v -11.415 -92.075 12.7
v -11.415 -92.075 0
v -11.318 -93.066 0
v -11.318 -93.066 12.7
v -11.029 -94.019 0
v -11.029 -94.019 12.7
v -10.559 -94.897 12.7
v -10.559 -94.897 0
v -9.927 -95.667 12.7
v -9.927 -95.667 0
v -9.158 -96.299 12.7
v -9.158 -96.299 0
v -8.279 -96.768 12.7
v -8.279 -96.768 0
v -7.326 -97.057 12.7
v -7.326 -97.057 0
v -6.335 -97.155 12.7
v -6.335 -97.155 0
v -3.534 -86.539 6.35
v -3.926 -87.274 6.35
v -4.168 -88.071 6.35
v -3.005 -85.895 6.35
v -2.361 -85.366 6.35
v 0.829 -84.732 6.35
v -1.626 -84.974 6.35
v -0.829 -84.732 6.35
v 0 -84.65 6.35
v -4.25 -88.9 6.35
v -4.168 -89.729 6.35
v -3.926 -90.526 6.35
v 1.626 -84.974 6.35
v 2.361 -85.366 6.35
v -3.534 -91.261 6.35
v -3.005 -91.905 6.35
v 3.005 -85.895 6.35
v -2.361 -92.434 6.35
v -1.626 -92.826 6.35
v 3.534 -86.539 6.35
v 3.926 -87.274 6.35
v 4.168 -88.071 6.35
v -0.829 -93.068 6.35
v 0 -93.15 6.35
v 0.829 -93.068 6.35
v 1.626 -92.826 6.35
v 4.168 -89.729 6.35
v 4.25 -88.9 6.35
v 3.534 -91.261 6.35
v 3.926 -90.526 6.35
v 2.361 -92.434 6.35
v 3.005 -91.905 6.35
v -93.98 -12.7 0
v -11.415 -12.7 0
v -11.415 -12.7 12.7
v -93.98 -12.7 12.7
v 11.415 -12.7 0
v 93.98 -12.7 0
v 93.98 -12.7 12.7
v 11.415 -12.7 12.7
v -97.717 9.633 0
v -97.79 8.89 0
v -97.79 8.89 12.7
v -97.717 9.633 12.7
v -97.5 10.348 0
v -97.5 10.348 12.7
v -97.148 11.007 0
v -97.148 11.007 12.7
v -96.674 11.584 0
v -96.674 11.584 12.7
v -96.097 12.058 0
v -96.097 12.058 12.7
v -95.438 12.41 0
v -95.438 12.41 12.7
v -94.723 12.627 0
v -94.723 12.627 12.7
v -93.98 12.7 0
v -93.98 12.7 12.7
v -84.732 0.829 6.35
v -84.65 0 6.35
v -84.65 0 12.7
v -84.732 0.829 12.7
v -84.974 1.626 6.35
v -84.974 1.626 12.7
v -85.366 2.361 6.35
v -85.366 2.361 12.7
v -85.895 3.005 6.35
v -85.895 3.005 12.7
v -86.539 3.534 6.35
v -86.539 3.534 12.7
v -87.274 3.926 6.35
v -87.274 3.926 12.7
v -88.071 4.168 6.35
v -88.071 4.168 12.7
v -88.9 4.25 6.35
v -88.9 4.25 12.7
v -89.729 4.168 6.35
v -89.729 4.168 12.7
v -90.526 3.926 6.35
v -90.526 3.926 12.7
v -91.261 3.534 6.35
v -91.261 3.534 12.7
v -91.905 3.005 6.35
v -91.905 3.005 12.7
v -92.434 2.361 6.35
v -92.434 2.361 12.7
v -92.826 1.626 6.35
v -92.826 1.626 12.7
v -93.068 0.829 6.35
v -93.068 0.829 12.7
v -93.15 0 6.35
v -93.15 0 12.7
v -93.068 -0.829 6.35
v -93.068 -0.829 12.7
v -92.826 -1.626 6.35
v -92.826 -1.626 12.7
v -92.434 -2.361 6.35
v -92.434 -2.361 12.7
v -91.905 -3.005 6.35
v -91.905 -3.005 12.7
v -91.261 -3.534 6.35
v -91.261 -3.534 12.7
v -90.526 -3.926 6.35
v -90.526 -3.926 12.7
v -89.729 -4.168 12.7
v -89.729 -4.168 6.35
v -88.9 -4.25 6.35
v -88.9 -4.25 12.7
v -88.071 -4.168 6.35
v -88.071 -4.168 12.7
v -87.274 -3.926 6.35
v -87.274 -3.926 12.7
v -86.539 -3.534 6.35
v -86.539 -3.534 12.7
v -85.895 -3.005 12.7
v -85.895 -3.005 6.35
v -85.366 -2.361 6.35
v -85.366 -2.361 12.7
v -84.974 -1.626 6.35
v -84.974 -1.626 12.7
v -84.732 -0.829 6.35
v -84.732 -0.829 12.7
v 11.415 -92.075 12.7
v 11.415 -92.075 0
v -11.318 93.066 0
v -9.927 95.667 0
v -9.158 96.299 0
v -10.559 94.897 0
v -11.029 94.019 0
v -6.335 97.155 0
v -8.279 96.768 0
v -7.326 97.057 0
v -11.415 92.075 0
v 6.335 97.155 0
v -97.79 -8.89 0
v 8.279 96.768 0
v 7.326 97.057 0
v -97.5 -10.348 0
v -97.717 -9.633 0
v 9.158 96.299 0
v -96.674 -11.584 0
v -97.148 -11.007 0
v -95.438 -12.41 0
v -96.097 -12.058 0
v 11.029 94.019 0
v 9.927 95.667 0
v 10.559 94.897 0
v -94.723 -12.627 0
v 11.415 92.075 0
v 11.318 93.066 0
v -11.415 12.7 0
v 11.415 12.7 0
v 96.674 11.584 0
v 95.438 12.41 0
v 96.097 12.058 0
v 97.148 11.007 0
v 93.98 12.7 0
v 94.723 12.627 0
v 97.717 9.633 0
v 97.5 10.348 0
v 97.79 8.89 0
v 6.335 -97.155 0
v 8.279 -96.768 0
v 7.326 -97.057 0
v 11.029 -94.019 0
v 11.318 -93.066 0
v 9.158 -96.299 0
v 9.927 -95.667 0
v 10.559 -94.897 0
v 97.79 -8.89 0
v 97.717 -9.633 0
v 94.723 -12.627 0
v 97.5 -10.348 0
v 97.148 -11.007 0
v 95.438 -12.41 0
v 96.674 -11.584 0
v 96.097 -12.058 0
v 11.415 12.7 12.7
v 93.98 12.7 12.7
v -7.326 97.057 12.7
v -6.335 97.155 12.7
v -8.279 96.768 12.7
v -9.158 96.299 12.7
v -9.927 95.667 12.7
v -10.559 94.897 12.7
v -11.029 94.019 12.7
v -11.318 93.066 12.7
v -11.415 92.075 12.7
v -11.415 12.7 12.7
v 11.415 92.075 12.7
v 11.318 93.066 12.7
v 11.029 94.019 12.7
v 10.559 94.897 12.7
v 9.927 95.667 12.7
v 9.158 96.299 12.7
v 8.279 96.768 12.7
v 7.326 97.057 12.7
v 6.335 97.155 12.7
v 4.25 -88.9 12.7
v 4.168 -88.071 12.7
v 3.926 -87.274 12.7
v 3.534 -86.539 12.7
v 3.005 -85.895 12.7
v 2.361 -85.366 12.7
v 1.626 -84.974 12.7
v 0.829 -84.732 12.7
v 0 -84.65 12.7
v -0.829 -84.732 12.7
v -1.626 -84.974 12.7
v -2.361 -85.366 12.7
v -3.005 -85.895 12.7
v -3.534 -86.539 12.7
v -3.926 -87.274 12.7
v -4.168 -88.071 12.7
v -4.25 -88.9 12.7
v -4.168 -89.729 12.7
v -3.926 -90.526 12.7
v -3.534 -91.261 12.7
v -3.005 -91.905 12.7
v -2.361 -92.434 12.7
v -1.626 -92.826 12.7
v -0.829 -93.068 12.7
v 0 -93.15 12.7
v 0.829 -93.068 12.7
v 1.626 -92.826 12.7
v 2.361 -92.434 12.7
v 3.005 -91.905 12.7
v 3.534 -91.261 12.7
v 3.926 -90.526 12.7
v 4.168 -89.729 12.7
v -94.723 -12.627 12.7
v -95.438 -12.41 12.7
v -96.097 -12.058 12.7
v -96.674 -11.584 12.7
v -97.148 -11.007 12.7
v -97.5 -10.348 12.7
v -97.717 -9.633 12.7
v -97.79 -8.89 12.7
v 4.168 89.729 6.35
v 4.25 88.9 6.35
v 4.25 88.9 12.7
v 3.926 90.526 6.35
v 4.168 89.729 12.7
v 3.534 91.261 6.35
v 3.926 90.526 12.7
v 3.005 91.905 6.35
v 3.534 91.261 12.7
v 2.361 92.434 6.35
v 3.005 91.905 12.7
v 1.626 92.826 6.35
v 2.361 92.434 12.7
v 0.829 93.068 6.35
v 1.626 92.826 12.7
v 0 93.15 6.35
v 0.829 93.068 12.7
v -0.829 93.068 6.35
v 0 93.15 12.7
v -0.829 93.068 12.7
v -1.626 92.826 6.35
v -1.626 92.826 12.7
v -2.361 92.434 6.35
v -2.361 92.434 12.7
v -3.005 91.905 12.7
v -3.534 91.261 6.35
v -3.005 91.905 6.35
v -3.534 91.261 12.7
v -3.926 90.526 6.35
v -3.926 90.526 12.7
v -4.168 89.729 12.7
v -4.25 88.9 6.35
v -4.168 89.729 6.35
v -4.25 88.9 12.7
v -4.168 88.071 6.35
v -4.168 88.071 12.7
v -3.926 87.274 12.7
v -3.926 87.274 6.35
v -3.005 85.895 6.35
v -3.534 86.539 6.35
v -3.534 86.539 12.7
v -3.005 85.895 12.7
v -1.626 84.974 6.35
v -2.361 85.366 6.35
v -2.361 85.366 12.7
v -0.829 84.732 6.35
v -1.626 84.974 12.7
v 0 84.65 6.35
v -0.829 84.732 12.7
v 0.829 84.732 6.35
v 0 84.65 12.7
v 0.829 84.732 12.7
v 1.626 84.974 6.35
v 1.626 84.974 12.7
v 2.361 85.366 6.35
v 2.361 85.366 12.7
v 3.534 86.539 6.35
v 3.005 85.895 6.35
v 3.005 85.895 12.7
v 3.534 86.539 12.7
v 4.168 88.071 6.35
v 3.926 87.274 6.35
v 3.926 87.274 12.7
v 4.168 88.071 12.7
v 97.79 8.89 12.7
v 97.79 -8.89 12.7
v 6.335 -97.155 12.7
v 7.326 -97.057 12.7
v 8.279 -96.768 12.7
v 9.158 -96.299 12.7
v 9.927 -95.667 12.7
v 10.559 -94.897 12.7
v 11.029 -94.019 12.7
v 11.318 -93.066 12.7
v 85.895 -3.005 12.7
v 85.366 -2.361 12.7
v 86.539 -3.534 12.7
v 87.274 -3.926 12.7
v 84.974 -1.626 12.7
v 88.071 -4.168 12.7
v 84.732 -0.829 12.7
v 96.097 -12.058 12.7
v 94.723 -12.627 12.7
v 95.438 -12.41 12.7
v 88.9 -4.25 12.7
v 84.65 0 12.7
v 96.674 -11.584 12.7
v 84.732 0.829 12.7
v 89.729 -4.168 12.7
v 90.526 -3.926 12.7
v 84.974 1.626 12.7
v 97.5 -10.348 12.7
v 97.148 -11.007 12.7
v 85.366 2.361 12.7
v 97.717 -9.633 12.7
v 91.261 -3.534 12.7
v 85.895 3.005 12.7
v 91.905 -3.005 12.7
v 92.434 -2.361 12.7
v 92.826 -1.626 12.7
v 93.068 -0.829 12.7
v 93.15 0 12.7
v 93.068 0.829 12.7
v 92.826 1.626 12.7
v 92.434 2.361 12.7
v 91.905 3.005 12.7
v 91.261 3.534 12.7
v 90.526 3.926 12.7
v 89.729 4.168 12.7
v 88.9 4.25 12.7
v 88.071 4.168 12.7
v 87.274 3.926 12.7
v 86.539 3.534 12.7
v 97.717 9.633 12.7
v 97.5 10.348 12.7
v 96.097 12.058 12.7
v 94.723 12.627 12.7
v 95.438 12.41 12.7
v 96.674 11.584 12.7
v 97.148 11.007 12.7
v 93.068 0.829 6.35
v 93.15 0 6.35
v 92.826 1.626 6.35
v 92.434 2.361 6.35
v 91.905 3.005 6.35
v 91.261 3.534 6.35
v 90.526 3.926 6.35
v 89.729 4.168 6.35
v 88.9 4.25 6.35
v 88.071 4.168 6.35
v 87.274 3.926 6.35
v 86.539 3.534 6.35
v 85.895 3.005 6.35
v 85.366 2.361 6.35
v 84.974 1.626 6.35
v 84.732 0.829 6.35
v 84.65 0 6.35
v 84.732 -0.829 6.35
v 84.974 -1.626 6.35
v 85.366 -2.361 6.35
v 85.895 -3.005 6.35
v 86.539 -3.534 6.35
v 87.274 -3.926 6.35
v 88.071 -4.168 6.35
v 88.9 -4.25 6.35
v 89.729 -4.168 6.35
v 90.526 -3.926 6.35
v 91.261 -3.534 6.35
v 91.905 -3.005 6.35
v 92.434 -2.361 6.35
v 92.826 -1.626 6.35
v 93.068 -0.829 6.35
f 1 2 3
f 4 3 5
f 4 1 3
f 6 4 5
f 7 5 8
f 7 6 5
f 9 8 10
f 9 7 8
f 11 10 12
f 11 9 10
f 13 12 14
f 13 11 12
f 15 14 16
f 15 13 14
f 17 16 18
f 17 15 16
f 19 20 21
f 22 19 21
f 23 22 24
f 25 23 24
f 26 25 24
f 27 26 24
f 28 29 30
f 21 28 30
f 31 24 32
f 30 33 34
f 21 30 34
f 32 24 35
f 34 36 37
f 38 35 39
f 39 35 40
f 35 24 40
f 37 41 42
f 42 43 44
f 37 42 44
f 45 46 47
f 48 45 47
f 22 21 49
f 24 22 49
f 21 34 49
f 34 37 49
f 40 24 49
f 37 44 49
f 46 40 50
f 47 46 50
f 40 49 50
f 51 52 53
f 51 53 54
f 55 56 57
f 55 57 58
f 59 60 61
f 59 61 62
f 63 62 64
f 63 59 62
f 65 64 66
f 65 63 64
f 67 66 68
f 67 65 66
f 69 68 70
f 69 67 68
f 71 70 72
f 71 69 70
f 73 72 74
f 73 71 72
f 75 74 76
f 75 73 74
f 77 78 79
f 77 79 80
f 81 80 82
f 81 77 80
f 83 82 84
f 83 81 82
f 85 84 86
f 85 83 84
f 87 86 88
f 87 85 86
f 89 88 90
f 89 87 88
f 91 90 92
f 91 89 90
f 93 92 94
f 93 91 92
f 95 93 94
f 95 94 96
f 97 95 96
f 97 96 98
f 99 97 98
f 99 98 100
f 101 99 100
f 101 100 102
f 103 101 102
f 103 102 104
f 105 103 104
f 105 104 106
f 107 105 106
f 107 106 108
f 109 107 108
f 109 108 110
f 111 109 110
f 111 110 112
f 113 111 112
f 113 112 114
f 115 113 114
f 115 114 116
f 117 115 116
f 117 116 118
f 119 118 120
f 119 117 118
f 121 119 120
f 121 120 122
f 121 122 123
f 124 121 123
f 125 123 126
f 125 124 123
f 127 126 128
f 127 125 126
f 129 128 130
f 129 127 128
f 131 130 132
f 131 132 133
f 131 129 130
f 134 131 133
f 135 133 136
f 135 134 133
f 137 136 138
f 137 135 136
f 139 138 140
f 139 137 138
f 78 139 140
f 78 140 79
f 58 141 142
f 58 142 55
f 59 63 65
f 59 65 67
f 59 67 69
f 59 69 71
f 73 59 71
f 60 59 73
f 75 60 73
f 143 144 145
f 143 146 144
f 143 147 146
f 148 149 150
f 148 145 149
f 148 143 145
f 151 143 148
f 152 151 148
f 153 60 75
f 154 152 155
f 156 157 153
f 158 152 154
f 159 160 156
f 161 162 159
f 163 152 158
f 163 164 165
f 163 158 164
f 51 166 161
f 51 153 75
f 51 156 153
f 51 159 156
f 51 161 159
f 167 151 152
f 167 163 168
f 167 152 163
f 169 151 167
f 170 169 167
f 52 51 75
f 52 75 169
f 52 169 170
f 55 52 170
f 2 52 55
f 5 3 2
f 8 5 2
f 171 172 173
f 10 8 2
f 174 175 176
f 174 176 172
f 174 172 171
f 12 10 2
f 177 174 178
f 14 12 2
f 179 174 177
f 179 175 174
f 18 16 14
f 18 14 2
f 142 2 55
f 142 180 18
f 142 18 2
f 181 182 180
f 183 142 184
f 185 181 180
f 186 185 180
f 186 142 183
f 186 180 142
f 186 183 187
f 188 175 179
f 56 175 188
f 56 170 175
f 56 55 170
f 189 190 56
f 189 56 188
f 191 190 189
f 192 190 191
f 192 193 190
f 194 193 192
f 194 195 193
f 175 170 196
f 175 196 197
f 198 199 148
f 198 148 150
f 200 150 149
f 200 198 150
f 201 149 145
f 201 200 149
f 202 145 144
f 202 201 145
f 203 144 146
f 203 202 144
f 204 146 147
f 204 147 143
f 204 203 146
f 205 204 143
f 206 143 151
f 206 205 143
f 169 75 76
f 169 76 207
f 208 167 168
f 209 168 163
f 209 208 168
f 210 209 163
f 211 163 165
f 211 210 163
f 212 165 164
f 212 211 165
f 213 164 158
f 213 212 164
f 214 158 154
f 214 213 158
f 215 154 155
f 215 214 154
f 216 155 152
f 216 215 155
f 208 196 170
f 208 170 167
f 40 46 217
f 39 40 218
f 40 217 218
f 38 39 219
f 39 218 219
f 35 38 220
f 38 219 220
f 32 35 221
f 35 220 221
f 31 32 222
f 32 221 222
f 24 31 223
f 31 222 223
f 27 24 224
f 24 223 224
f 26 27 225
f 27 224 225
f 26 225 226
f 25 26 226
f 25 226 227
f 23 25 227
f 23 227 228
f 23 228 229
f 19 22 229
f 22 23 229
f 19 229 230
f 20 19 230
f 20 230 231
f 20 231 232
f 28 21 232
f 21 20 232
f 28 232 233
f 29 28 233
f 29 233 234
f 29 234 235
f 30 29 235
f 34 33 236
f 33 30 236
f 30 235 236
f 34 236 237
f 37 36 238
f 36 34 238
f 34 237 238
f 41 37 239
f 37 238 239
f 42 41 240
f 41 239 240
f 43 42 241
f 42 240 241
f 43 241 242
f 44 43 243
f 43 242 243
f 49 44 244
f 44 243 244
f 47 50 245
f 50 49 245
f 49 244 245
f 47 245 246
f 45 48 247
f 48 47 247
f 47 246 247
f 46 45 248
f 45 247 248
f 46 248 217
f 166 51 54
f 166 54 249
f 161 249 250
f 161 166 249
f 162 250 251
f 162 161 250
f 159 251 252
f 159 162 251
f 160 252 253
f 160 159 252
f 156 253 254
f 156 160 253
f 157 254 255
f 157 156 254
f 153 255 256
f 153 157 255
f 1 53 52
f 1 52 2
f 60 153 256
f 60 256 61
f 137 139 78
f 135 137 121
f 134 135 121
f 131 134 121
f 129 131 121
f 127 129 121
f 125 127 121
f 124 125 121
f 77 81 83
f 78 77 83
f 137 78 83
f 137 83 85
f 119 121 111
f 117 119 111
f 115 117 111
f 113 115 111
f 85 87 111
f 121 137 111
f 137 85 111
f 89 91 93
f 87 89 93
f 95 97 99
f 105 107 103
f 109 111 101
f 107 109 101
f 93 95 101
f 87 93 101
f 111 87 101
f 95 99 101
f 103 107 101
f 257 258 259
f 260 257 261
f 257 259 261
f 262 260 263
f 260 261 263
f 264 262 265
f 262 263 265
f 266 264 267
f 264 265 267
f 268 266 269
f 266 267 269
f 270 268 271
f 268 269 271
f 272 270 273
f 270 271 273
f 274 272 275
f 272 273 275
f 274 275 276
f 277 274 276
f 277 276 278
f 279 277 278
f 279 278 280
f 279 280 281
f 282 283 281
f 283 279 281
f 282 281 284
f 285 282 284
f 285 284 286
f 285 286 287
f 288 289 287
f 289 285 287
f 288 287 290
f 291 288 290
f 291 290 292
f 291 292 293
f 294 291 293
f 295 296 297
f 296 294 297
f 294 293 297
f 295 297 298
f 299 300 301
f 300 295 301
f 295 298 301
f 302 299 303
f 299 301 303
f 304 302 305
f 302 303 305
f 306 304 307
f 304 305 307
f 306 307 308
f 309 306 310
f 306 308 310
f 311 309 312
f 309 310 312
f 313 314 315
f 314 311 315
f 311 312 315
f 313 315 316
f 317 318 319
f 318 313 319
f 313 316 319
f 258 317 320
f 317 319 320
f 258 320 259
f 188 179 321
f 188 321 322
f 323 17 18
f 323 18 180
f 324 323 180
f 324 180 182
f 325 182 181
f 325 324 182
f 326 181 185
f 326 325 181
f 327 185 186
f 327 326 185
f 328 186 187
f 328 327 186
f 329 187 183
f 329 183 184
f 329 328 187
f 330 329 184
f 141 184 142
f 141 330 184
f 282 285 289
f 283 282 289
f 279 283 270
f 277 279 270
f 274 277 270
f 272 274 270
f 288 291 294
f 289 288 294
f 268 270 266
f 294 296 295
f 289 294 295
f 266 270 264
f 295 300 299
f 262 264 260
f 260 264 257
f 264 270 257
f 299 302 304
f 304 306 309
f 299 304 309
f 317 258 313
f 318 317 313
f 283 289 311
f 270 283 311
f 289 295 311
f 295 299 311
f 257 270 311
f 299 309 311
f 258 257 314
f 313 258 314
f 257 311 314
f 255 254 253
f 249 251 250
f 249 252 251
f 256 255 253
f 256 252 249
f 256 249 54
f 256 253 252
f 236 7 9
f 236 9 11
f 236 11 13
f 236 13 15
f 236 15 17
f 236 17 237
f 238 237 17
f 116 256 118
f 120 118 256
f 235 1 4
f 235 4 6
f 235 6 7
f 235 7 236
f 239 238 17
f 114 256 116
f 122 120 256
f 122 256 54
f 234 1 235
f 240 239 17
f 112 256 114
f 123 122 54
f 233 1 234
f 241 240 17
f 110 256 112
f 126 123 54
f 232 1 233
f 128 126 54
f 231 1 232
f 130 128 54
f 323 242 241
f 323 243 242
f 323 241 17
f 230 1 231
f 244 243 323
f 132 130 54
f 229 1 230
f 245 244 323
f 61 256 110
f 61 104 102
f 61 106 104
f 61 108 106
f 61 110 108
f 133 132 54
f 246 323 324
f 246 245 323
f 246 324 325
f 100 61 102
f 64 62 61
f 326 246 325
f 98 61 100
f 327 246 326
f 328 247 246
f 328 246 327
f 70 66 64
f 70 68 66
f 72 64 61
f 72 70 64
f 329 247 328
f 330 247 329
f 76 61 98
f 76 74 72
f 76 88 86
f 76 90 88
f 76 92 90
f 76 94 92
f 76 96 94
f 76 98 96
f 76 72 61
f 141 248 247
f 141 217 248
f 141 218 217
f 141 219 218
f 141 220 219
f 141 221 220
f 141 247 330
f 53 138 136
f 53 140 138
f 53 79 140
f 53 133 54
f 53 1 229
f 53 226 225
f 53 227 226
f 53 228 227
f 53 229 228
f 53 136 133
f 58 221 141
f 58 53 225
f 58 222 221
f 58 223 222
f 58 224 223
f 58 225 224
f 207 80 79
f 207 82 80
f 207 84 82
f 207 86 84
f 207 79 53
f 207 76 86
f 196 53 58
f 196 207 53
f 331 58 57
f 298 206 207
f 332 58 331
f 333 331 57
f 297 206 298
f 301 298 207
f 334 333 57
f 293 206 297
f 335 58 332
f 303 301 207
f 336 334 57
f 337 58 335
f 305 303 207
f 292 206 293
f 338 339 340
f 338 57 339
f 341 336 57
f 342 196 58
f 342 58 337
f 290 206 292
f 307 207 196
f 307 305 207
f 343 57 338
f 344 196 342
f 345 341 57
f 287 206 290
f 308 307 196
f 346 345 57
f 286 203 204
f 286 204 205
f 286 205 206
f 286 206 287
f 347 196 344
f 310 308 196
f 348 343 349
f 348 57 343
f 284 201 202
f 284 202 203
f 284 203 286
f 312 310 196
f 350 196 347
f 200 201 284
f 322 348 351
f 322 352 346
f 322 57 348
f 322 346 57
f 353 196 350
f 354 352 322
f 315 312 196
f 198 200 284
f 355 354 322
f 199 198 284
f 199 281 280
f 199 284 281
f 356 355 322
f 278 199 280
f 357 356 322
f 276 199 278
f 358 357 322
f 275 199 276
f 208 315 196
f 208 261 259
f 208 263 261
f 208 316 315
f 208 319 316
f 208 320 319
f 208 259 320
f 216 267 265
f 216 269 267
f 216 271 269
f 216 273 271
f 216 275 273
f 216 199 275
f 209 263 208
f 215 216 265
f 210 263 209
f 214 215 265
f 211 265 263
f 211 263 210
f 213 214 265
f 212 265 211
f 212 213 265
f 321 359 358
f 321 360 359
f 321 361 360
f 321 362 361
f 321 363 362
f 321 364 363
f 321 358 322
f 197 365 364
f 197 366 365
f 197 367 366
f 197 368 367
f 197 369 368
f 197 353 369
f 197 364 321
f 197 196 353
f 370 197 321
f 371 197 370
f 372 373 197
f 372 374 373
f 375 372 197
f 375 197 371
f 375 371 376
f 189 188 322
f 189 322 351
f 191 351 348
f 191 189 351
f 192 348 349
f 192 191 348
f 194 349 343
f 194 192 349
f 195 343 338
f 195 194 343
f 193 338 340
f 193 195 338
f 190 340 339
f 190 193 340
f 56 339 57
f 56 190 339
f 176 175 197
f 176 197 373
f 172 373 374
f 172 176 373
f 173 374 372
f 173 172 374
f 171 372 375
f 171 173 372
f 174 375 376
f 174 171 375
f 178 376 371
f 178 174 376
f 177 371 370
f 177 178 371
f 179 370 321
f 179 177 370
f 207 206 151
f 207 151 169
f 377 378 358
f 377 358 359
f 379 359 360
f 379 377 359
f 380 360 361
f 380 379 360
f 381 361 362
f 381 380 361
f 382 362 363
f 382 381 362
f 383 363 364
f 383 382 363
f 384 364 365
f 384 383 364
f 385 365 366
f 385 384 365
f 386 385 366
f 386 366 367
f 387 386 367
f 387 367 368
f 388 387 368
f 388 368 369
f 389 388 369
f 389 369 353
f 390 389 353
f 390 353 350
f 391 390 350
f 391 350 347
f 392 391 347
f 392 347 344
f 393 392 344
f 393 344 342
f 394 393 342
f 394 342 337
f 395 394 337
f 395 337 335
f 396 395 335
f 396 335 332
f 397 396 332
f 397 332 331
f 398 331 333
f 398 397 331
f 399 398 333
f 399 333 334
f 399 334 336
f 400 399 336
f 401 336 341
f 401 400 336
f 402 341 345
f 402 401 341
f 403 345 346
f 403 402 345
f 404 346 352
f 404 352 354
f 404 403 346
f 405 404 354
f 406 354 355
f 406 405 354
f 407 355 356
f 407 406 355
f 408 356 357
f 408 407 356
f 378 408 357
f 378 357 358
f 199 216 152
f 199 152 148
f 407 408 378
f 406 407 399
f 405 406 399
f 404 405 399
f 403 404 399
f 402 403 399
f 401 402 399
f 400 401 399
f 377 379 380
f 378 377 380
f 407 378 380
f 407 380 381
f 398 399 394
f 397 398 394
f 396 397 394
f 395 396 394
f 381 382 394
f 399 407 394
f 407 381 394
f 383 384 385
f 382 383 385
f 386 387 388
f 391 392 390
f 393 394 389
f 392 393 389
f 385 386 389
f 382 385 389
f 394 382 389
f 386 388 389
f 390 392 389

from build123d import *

# Parameters (mm, degrees)
SKETCH1_R           = 4.25
BOSS_EXTRUDE1_DEPTH = 12.7
SKETCH3_R           = 4.25
BOSS_EXTRUDE3_DEPTH = 12.7
SKETCH2_R           = 4.25
BOSS_EXTRUDE2_DEPTH = 6.35


with BuildPart() as part:
    # Sketch1 → Boss-Extrude1 (new body)
    with BuildSketch(Plane.XY):
        with BuildLine():
            Line((93.98, -12.7), (-93.98, -12.7))
            ThreePointArc((-93.98, -12.7), (-96.674076836, -11.584076836), (-97.79, -8.89))
            Line((-97.79, -8.89), (-97.79, 8.89))
            ThreePointArc((-97.79, 8.89), (-96.674076836, 11.584076836), (-93.98, 12.7))
            Line((-93.98, 12.7), (93.98, 12.7))
            ThreePointArc((93.98, 12.7), (96.674076836, 11.584076836), (97.79, 8.89))
            Line((97.79, 8.89), (97.79, -8.89))
            ThreePointArc((97.79, -8.89), (96.674076836, -11.584076836), (93.98, -12.7))
        make_face()
        with Locations((-88.9, 0)):
            Circle(SKETCH1_R, mode=Mode.SUBTRACT)
        with Locations((88.9, 0)):
            Circle(SKETCH1_R, mode=Mode.SUBTRACT)
    extrude(amount=BOSS_EXTRUDE1_DEPTH)

    # Sketch3 → Boss-Extrude3 (add, through all)
    with BuildSketch(Plane.XY.offset(12.7)):
        with BuildLine():
            Line((-6.335384206, -97.155), (6.335384206, -97.155))
            ThreePointArc((6.335384206, -97.155), (9.927486654, -95.667102448), (11.415384206, -92.075))
            Line((11.415384206, -92.075), (11.415384206, 92.075))
            ThreePointArc((11.415384206, 92.075), (9.927486654, 95.667102448), (6.335384206, 97.155))
            Line((6.335384206, 97.155), (-6.335384206, 97.155))
            ThreePointArc((-6.335384206, 97.155), (-9.927486654, 95.667102448), (-11.415384206, 92.075))
            Line((-11.415384206, 92.075), (-11.415384206, -92.075))
            ThreePointArc((-11.415384206, -92.075), (-9.927486654, -95.667102448), (-6.335384206, -97.155))
        make_face()
        with Locations((0, 88.9)):
            Circle(SKETCH3_R, mode=Mode.SUBTRACT)
        with Locations((0, -88.9)):
            Circle(SKETCH3_R, mode=Mode.SUBTRACT)
    extrude(amount=-BOSS_EXTRUDE3_DEPTH)

    # Sketch2 → Boss-Extrude2 (add)
    with BuildSketch(Plane(origin=(0, 0, 0), x_dir=(-1, 0, 0), z_dir=(0, 0, -1))):
        with Locations(Location((0, 88.9, 0), (0, 0, 180))):
            Circle(SKETCH2_R)
        with Locations((-88.9, 0)):
            Circle(SKETCH2_R)
        with Locations(Location((0, -88.9, 0), (0, 0, 180))):
            Circle(SKETCH2_R)
        with Locations((88.9, 0)):
            Circle(SKETCH2_R)
    extrude(amount=-BOSS_EXTRUDE2_DEPTH)


solid = part.part
